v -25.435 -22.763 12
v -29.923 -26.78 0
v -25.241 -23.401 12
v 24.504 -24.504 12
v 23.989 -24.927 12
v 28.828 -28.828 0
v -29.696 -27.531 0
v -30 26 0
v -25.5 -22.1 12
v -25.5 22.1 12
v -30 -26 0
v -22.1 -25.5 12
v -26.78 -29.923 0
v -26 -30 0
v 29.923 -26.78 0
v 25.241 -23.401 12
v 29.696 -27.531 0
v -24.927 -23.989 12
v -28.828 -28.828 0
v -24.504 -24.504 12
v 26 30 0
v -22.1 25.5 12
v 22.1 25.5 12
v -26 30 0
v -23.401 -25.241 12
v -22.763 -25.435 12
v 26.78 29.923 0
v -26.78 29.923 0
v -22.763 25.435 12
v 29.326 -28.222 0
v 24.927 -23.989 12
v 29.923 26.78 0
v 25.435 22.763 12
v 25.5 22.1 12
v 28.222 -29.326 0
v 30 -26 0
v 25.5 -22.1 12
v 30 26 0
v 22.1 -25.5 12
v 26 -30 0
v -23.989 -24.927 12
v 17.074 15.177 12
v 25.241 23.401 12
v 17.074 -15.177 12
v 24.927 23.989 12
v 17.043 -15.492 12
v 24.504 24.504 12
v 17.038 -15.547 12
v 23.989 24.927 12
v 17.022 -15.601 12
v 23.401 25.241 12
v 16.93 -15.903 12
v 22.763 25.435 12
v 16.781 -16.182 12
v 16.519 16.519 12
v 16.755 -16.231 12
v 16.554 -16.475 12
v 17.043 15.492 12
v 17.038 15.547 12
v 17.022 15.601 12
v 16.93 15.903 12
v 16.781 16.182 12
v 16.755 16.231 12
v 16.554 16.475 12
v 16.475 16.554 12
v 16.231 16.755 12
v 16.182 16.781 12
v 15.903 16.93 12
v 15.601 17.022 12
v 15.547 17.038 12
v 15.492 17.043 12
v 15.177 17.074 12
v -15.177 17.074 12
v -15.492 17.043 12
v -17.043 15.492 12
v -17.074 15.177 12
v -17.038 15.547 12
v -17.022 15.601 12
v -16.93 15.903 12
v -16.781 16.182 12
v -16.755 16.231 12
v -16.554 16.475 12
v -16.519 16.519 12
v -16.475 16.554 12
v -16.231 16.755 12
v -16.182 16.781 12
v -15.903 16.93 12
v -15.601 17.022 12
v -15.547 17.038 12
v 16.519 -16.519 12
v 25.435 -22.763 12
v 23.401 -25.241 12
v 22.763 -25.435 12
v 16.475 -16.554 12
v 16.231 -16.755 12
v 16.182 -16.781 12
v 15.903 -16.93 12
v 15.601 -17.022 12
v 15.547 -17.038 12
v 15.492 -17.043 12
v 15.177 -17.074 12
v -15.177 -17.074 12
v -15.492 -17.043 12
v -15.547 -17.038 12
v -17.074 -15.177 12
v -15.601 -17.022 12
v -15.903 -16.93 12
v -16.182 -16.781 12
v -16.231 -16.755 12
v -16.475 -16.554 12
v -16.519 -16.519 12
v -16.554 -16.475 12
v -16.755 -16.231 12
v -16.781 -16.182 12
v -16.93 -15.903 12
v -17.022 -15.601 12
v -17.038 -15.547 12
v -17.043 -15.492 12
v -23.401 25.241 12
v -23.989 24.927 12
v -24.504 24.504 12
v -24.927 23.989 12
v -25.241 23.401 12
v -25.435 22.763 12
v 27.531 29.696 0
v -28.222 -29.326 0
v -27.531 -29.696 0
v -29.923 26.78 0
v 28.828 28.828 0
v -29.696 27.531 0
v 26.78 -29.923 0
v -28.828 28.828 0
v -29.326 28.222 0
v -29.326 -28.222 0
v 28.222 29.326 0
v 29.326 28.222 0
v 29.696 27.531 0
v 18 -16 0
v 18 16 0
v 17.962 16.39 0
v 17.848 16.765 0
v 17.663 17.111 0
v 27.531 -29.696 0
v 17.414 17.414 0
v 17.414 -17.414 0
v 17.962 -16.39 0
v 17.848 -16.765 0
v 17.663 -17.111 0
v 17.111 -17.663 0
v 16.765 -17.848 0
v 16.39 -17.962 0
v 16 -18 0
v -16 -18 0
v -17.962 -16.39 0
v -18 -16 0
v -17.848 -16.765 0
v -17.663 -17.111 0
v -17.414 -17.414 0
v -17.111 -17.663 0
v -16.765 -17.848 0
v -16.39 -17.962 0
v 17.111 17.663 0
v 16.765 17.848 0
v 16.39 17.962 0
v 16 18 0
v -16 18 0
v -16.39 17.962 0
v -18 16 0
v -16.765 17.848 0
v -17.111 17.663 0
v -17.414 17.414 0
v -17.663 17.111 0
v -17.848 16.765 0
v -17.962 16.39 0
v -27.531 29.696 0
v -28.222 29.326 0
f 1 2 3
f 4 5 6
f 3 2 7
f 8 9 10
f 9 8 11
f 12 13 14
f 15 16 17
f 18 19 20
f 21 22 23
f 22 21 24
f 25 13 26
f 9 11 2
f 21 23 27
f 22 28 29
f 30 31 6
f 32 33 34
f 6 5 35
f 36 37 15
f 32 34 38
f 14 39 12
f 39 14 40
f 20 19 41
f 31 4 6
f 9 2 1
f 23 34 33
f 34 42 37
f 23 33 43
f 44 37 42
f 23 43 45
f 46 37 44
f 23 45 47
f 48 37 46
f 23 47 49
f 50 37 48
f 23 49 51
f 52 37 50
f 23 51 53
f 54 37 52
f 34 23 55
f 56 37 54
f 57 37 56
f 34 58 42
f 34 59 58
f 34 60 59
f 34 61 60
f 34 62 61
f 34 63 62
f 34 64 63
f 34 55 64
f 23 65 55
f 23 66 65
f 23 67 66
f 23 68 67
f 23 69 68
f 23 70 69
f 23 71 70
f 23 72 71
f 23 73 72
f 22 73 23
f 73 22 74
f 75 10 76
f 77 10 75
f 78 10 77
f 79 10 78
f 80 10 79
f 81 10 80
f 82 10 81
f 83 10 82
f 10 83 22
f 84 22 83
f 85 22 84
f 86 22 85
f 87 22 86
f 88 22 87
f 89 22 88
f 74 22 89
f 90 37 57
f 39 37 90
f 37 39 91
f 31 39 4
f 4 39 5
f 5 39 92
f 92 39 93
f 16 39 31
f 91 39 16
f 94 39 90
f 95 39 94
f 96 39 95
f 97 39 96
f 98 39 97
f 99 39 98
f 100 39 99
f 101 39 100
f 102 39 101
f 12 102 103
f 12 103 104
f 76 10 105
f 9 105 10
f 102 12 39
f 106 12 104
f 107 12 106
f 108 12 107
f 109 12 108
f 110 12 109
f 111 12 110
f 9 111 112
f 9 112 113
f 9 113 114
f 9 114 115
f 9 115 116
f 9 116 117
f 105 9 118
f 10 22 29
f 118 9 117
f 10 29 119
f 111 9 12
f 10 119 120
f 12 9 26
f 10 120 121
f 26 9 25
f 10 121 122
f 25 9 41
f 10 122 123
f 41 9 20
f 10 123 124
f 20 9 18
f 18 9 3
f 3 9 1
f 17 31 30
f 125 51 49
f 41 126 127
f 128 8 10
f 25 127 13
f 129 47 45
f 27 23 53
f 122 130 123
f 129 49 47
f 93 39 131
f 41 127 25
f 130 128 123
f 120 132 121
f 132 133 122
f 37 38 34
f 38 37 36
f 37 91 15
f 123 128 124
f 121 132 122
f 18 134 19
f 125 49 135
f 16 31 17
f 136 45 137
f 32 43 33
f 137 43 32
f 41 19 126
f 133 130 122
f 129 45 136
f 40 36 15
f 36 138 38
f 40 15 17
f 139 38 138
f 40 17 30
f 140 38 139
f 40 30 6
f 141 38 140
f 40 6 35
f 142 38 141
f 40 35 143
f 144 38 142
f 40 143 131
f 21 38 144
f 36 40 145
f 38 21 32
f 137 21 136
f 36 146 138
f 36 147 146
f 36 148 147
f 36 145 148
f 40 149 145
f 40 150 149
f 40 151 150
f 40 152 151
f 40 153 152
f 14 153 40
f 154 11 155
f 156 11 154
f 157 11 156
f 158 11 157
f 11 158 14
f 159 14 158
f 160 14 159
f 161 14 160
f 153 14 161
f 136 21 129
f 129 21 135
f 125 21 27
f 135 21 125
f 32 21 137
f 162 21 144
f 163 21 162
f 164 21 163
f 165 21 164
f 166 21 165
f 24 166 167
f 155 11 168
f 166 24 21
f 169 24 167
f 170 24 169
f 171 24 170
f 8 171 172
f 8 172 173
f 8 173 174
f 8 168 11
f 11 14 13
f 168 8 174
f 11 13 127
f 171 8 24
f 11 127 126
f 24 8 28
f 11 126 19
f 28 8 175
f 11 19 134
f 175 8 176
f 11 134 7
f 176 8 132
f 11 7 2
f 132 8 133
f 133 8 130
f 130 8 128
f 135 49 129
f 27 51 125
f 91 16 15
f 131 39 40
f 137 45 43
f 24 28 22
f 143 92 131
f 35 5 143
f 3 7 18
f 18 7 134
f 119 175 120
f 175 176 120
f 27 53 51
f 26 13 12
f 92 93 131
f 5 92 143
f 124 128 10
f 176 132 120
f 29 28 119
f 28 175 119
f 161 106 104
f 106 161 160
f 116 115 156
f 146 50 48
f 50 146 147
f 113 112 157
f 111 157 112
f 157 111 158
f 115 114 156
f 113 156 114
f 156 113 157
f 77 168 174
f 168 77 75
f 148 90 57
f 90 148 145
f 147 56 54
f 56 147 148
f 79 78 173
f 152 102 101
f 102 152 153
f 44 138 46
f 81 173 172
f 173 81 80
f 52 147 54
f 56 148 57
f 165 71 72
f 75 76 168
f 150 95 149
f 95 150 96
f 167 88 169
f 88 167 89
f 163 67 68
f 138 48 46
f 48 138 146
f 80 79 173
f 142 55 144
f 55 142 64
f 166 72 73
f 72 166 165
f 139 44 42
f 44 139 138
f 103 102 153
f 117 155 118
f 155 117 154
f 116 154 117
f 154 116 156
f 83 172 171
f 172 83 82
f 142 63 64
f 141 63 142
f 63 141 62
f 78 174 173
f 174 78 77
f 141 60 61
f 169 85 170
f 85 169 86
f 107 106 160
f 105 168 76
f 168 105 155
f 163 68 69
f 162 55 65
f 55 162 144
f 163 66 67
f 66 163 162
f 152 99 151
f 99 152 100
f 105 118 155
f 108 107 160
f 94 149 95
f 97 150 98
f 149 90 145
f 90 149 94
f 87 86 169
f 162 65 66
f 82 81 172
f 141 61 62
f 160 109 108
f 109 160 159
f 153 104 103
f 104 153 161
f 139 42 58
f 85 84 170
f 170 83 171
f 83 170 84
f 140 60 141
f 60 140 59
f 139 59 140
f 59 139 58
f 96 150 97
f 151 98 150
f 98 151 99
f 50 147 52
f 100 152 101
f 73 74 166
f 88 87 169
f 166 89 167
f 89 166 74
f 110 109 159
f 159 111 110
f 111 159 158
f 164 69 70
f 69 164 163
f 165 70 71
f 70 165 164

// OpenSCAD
$fn = 32;

// ----------------------------------------------------------------------
// Display bezel: 60 x 60 mm frame, opening 36x36 mm
// ----------------------------------------------------------------------

// --- parameters (mm) ---
length = 60;              // frame outside length, X
width = 60;               // frame outside width, Y
frame_w = 12;             // frame width
thickness = 12;           // frame thickness
corner_r = 4;             // outside corner radius
chamfer = 0.85;           // outer wall taper
funnel = 0.94;            // inner opening taper
opening_l = 36;           // opening length
opening_w = 36;           // opening width
inner_r = 2;              // opening corner radius

/* rounded-rectangle outlines, generated with loops */
module rounded_ring(l_nom, w_nom, r) {
  hull() {
    for (sx = [-1, 1]) for (sy = [-1, 1])
      translate([sx * (l_nom / 2 - r), sy * (w_nom / 2 - r)]) circle(r = r);
  }
}

difference() {
  /* frame body, drafted so the outer edge is a variable-depth chamfer */
  linear_extrude(height = thickness, scale = chamfer)
    rounded_ring(length, width, corner_r);
  /* viewing opening, drafted the other way for a funnel edge */
  linear_extrude(height = thickness + 2, scale = funnel)
    translate([0, 0, -1]) rounded_ring(opening_l, opening_w, inner_r);
}
